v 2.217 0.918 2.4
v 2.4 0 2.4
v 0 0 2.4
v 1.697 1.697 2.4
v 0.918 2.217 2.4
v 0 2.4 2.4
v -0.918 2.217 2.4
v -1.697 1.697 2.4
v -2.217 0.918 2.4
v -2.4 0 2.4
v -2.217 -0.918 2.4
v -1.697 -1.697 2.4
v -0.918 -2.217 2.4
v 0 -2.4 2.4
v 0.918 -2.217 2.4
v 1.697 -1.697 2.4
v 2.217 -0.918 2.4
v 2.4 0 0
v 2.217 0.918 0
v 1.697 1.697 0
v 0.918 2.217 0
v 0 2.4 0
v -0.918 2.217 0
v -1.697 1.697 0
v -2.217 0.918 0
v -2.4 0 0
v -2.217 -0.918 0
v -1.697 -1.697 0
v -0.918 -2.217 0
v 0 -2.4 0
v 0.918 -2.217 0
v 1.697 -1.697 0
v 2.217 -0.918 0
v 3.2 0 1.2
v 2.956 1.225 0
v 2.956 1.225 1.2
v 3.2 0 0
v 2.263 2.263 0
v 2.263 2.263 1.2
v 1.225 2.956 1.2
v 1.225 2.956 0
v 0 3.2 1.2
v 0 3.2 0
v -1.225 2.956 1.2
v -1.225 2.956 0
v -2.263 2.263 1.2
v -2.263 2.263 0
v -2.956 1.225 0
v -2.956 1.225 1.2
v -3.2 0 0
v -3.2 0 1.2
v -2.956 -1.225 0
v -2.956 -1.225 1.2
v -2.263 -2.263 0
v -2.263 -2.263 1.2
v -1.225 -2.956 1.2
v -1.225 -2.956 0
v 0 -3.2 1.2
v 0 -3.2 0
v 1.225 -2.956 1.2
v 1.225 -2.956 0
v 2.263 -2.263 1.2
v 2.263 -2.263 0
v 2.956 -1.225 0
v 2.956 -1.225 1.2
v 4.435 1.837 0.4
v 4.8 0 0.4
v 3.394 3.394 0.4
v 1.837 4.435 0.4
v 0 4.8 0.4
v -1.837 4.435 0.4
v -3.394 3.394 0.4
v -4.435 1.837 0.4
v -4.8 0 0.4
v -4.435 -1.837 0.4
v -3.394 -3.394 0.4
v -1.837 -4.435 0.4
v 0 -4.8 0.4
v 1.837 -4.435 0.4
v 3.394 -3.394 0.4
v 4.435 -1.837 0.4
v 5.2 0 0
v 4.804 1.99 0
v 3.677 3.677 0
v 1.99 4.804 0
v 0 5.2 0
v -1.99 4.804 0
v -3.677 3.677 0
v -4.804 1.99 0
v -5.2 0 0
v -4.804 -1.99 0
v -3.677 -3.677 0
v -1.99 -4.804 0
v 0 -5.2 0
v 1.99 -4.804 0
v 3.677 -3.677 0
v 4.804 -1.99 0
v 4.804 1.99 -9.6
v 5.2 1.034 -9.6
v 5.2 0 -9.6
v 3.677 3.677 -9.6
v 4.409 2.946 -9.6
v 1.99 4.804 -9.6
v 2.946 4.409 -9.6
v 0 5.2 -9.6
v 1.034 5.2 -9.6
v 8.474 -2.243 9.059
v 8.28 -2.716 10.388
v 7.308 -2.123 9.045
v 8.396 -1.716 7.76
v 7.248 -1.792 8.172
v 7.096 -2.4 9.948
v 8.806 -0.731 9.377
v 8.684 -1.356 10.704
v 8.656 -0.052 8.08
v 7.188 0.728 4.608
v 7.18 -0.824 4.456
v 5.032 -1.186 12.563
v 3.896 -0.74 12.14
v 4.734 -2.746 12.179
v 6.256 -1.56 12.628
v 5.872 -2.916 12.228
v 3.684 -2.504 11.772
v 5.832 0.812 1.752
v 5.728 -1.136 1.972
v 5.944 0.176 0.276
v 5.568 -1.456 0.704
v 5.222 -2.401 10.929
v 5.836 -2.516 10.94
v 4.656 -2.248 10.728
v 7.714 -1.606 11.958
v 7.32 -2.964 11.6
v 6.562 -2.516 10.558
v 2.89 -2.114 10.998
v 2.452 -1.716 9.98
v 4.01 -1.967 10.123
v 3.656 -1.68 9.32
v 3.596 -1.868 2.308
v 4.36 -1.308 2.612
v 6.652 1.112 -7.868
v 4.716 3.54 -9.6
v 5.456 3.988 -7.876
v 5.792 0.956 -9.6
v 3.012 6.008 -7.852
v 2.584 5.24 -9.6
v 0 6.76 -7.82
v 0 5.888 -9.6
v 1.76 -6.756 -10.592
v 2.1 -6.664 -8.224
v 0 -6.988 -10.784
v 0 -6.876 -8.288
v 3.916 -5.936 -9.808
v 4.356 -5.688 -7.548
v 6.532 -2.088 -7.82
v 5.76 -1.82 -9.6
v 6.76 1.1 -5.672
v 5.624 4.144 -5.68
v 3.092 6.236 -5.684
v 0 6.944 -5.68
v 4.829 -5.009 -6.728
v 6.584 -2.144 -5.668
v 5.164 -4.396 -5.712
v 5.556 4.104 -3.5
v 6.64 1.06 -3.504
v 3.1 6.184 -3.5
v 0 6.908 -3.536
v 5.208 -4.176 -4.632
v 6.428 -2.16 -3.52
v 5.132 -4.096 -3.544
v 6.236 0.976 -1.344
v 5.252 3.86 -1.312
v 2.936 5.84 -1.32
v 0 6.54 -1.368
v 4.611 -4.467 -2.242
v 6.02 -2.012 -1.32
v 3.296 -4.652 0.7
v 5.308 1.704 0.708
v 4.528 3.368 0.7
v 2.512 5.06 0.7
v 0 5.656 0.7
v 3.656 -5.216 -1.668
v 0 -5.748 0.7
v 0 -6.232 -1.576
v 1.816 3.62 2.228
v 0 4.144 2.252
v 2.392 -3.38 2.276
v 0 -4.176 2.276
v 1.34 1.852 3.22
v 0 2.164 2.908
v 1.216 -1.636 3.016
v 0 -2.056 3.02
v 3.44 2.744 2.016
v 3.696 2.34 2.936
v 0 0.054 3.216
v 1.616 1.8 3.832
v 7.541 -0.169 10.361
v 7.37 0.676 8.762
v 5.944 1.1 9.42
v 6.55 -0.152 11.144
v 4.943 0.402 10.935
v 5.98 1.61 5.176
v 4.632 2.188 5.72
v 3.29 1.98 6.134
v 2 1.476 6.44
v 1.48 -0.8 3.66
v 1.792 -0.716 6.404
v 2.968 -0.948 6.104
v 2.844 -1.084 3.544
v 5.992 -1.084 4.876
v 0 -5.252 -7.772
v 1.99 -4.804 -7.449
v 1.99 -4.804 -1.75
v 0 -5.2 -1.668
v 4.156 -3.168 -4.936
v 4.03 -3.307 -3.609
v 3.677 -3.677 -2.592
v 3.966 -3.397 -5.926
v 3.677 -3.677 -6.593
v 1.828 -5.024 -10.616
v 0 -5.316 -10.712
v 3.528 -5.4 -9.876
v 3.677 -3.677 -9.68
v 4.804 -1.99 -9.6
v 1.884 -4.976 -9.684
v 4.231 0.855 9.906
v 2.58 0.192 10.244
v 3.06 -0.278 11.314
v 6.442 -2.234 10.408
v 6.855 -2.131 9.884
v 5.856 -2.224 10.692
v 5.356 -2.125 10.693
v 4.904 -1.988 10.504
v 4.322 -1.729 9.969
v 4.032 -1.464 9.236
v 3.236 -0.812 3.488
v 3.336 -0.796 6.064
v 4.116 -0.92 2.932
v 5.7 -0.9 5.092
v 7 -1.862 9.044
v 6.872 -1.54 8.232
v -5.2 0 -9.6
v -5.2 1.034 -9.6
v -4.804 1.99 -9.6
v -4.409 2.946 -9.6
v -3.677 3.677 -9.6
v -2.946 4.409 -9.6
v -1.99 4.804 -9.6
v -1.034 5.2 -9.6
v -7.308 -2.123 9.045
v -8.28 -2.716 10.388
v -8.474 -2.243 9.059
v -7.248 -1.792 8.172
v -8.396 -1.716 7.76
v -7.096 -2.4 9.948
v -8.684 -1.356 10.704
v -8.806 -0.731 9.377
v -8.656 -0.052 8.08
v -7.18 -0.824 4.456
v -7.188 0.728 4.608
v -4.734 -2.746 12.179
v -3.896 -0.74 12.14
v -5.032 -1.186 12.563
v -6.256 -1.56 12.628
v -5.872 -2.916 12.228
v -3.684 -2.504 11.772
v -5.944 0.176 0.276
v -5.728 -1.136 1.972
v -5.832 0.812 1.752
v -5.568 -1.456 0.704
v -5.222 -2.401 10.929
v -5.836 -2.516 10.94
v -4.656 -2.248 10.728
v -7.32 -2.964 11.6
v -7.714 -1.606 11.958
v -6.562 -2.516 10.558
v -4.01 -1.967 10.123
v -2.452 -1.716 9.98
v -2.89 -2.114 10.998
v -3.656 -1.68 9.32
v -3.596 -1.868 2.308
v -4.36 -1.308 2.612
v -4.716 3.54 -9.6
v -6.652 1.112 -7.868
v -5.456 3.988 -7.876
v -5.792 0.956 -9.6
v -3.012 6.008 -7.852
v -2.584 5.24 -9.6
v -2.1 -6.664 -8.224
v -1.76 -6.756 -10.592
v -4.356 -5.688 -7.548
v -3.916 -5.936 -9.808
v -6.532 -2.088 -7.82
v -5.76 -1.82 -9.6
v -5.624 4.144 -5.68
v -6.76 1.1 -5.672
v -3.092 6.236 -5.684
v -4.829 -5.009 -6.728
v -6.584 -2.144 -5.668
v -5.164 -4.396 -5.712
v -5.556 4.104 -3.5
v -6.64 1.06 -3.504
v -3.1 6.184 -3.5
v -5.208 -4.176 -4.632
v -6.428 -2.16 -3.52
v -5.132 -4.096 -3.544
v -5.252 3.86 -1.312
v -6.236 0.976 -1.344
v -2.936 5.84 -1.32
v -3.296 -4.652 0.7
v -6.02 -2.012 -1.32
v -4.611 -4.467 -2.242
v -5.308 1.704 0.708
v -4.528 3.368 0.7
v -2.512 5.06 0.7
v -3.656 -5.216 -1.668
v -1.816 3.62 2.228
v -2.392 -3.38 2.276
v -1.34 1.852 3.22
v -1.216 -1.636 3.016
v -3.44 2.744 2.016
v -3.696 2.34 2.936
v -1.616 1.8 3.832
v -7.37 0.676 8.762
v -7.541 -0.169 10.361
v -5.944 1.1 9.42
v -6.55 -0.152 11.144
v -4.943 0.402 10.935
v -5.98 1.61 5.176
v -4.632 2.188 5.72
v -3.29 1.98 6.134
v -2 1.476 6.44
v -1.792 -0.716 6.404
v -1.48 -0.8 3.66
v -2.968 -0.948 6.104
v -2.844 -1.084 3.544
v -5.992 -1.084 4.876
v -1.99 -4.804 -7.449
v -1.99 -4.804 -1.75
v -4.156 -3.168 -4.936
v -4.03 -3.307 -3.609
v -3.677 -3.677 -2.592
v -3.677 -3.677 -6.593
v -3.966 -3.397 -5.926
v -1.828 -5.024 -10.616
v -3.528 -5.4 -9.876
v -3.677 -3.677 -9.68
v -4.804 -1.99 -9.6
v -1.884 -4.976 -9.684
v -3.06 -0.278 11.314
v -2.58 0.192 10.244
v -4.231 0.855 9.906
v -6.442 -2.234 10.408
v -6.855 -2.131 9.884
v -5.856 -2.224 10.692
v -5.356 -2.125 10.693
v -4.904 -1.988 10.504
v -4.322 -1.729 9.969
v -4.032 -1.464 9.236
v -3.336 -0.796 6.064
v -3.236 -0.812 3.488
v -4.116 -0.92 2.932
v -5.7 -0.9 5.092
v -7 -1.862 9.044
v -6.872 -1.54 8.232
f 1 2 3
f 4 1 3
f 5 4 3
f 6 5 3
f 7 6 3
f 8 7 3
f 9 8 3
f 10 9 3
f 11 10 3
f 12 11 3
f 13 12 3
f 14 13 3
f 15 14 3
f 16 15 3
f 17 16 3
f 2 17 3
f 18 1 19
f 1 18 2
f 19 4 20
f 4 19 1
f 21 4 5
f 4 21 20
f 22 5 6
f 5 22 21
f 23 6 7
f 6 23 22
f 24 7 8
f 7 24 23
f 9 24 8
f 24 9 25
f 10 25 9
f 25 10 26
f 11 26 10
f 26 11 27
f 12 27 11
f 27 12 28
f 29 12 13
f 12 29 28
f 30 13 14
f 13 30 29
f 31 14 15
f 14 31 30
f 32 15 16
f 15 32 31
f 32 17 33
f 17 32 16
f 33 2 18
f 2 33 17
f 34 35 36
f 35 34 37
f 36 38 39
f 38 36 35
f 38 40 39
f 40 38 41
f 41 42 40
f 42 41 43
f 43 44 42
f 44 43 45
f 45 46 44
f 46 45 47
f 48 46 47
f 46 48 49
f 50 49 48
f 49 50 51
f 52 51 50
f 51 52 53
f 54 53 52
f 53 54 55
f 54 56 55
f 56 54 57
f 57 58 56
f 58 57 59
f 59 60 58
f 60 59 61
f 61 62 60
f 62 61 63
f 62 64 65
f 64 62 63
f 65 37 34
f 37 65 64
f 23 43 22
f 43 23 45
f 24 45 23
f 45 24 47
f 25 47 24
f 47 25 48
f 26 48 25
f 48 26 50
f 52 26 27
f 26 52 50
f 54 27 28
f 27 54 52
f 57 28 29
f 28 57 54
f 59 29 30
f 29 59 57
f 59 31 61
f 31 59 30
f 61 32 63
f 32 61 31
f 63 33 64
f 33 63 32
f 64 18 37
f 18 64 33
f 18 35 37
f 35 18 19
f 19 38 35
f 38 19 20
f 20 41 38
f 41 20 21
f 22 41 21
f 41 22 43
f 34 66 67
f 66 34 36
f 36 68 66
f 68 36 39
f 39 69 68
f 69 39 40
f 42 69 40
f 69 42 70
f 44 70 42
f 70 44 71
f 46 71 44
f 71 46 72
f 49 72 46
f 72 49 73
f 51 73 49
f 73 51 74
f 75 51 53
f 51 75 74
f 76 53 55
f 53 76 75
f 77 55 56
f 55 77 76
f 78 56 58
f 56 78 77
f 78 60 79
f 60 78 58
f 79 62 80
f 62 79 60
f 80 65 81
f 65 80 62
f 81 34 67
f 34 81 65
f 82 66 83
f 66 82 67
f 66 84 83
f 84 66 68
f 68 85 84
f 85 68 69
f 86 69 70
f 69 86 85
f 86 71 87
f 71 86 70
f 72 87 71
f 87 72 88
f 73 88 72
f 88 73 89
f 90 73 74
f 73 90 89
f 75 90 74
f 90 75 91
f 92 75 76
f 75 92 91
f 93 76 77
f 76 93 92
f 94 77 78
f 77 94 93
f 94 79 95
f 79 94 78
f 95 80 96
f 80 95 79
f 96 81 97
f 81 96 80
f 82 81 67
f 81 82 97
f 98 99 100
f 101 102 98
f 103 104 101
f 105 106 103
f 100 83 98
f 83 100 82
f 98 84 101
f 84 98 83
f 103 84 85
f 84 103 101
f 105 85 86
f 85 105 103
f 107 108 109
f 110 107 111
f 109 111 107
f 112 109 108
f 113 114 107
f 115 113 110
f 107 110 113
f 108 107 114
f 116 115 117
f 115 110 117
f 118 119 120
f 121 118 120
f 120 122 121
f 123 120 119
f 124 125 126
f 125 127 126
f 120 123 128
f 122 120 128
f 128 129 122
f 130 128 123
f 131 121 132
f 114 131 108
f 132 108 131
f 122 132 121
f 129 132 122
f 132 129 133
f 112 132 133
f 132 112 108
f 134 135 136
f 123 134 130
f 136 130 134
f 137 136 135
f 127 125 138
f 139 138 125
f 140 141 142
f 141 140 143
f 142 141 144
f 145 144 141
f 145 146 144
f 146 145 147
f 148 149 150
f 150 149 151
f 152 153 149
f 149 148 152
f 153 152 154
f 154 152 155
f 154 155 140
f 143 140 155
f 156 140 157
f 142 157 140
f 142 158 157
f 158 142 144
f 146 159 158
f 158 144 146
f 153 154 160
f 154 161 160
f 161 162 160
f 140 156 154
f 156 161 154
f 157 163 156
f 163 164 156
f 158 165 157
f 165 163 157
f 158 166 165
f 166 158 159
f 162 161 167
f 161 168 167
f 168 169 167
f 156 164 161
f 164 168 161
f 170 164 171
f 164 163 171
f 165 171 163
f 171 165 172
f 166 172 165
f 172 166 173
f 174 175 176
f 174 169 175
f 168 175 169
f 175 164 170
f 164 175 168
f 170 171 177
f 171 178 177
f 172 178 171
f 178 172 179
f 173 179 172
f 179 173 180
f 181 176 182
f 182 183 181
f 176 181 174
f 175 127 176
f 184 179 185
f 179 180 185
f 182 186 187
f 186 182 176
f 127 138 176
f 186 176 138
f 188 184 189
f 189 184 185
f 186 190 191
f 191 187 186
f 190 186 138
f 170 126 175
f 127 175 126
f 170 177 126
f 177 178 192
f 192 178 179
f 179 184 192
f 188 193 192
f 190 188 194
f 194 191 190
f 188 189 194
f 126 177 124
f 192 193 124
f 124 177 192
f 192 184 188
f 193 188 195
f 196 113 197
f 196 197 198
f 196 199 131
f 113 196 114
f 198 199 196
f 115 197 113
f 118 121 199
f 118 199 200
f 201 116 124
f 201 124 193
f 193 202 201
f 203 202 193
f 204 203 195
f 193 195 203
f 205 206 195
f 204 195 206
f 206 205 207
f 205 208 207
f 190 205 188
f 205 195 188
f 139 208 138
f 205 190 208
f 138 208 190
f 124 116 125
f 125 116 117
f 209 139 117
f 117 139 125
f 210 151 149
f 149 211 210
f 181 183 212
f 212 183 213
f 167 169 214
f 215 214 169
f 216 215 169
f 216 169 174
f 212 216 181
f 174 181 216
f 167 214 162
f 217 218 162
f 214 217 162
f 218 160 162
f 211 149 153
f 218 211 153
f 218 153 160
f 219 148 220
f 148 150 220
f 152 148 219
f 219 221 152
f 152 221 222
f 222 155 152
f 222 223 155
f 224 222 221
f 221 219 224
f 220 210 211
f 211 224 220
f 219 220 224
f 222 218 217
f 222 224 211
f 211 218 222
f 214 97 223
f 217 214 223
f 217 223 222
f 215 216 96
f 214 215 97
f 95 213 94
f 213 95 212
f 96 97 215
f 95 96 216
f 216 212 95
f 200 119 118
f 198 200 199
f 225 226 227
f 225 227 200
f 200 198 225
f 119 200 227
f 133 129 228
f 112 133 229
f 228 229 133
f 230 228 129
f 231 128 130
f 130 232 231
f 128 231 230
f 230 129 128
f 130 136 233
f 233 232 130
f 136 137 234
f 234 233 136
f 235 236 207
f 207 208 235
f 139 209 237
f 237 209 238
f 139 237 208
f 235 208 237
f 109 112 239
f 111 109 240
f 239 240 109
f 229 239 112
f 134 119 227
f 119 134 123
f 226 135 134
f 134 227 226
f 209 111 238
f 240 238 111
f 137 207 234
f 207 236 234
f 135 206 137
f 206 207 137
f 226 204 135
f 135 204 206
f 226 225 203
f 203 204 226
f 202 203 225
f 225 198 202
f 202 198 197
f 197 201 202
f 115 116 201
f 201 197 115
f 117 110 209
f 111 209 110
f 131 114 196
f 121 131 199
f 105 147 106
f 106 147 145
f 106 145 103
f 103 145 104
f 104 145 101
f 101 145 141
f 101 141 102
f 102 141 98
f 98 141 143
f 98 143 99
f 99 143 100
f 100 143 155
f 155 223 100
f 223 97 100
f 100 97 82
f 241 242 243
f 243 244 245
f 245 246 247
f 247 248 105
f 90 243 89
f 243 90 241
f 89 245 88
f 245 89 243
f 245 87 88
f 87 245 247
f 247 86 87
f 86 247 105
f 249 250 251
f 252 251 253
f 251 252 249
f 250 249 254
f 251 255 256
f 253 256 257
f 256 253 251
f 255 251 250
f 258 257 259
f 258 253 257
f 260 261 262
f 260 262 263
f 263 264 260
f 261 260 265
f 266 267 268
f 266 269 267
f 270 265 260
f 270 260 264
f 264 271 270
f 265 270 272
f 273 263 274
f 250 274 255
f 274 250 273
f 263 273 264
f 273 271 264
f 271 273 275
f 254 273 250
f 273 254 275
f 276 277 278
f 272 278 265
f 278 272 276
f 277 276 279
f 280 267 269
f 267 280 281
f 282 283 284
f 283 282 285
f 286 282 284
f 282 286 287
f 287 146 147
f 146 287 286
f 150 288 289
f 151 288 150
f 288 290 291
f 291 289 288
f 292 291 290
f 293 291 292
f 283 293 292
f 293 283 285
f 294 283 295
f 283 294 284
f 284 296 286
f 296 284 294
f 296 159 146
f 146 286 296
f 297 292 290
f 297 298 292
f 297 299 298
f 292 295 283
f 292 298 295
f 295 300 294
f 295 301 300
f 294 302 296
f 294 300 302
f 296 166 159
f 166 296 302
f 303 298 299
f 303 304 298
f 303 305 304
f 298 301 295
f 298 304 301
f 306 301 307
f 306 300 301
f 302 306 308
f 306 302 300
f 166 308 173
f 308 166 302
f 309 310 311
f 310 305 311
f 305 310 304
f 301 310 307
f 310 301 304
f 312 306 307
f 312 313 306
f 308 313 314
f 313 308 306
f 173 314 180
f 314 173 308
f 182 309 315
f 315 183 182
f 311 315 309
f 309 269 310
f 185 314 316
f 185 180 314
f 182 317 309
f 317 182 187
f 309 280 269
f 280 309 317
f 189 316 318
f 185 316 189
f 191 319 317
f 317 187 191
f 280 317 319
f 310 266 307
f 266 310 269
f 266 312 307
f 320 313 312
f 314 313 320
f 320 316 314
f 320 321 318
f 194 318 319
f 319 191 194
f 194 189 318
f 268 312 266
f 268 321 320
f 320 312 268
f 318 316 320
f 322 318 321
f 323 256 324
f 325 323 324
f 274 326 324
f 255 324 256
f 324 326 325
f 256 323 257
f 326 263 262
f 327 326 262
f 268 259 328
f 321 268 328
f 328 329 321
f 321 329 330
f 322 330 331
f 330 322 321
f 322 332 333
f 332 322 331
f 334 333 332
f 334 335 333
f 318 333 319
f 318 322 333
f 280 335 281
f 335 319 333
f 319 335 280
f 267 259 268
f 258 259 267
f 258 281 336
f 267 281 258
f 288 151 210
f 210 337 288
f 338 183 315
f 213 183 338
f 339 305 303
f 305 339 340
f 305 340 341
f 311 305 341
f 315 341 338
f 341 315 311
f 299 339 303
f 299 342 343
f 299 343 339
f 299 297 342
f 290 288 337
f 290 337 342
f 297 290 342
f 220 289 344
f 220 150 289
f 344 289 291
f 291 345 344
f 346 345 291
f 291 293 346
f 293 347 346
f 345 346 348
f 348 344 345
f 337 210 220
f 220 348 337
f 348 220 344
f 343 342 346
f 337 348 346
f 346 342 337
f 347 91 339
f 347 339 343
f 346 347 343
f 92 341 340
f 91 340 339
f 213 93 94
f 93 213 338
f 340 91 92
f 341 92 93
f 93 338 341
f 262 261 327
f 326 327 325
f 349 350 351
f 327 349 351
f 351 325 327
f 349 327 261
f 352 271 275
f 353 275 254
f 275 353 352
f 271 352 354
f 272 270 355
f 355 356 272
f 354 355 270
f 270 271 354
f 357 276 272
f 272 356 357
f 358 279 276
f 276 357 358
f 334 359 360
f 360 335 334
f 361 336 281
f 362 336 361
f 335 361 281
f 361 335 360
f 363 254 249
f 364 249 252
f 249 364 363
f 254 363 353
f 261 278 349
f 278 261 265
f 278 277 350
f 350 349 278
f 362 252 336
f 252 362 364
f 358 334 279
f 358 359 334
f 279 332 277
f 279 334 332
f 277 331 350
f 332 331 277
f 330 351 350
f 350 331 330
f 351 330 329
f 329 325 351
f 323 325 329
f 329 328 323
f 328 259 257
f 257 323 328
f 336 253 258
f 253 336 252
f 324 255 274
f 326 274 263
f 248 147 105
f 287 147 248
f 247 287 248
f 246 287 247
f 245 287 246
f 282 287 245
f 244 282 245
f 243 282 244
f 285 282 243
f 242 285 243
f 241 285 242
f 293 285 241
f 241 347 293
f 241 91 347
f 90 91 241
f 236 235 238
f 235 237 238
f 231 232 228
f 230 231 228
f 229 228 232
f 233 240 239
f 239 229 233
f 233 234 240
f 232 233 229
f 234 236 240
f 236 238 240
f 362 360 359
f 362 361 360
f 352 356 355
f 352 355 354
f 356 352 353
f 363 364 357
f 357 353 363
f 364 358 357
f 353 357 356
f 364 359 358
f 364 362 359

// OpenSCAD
use <../lib.scad>
use <../p/4-4con12.scad>
use <../p/4-4con2.scad>
use <../p/4-4disc.scad>
use <s/99244s01.scad>
use <s/99244s02.scad>
use <../p/stud4h.scad>
function ldraw_lib__99244() = [
// 0 Minifig Headdress Rabbit
// 0 Name: 99244.dat
// 0 Author: Gerald Lasser [GeraldLasser]
// 0 !LDRAW_ORG Part UPDATE 2023-04
// 0 !LICENSE Licensed under CC BY 4.0 : see CAreadme.txt
// 
// 0 BFC CERTIFY CCW
  [0,"BFC","CERTIFY"],
  [0,"BFC","CCW"],
// 
// 0 !CATEGORY Minifig Headwear
// 0 !KEYWORDS Bunny, Costume, Ears, mask
// 
// 0 !HISTORY 2023-08-25 [OrionP] Official Update 2023-04
// 
// 
// 1 16 0 -6 0 6 0 0 0 -1 0 0 0 6 4-4disc.dat
  [1,16,0,-6,0,6,0,0,0,-1,0,0,0,6, ldraw_lib__4_4disc()],
// 1 16 0 -3 0 1 0 0 0 -.75 0 0 0 1 stud4h.dat
  [1,16,0,-3,0,1,0,0,0,-.75,0,0,0,1, ldraw_lib__stud4h()],
// 0 BFC INVERTNEXT
  [0,"BFC","INVERTNEXT"],
// 1 16 0 -1 0 4 0 0 0 -2 0 0 0 4 4-4con2.dat
  [1,16,0,-1,0,4,0,0,0,-2,0,0,0,4, ldraw_lib__4_4con2()],
// 0 BFC INVERTNEXT
  [0,"BFC","INVERTNEXT"],
// 1 16 0 0 0 1 0 0 0 -1 0 0 0 1 4-4con12.dat
  [1,16,0,0,0,1,0,0,0,-1,0,0,0,1, ldraw_lib__4_4con12()],
// 
// 1 16 0 0 0 1 0 0 0 1 0 0 0 1 s\99244s01.dat
  [1,16,0,0,0,1,0,0,0,1,0,0,0,1, ldraw_lib__s__99244s01()],
// 1 16 0 0 0 -1 0 0 0 1 0 0 0 1 s\99244s01.dat
  [1,16,0,0,0,-1,0,0,0,1,0,0,0,1, ldraw_lib__s__99244s01()],
// 
// 1 16 0 0 0 1 0 0 0 1 0 0 0 1 s\99244s02.dat
  [1,16,0,0,0,1,0,0,0,1,0,0,0,1, ldraw_lib__s__99244s02()],
// 1 16 0 0 0 -1 0 0 0 1 0 0 0 1 s\99244s02.dat
  [1,16,0,0,0,-1,0,0,0,1,0,0,0,1, ldraw_lib__s__99244s02()],
// 
// 5 24 0 8.84 17.27 0 3.42 16.35 -7.34 3.3 14.6 7.34 3.3 14.6
  [5,24,0,8.84,17.27,0,3.42,16.35,-7.34,3.3,14.6,7.34,3.3,14.6],
// 5 24 0 3.94 -15.58 0 4.17 -13 4.9751 4.3745 -12.0107 -4.9751 4.3745 -12.0107
  [5,24,0,3.94,-15.58,0,4.17,-13,4.9751,4.3745,-12.0107,-4.9751,4.3745,-12.0107],
// 5 24 0 19.43 -13.13 0 20.72 -17.19 5.25 20.56 -16.66 -5.25 20.56 -16.66
  [5,24,0,19.43,-13.13,0,20.72,-17.19,5.25,20.56,-16.66,-5.25,20.56,-16.66],
// 5 24 0 -7.55 -5.14 0 -5.69 -10.44 5.98 -5.69 -8.45 -5.98 -5.69 -8.45
  [5,24,0,-7.55,-5.14,0,-5.69,-10.44,5.98,-5.69,-8.45,-5.98,-5.69,-8.45],
// 5 24 0 24 14.72 0 19.55 16.9 -7.53 19.63 15.02 7.53 19.63 15.02
  [5,24,0,24,14.72,0,19.55,16.9,-7.53,19.63,15.02,7.53,19.63,15.02],
// 5 24 0 -7.27 5.41 0 -8.04 .135 3.35 -8.05 4.63 -3.35 -8.05 4.63
  [5,24,0,-7.27,5.41,0,-8.04,.135,3.35,-8.05,4.63,-3.35,-8.05,4.63],
// 5 24 0 -5.63 10.36 0 -7.27 5.41 4.54 -5.57 9.05 -4.54 -5.57 9.05
  [5,24,0,-5.63,10.36,0,-7.27,5.41,4.54,-5.57,9.05,-4.54,-5.57,9.05],
// 5 24 0 20.72 -17.19 0 26.96 -17.47 -5.25 20.56 -16.66 5.25 20.56 -16.66
  [5,24,0,20.72,-17.19,0,26.96,-17.47,-5.25,20.56,-16.66,5.25,20.56,-16.66],
// 5 24 0 19.55 16.9 0 14.2 17.36 -7.53 19.63 15.02 7.53 19.63 15.02
  [5,24,0,19.55,16.9,0,14.2,17.36,-7.53,19.63,15.02,7.53,19.63,15.02],
// 5 24 0 -8.04 .135 0 -7.55 -5.14 3.04 -7.54 -4.09 -3.04 -7.54 -4.09
  [5,24,0,-8.04,.135,0,-7.55,-5.14,3.04,-7.54,-4.09,-3.04,-7.54,-4.09],
// 5 24 0 4.17 -13 0 0 -13 -4.9751 0 -12.0107 4.9751 0 -12.0107
  [5,24,0,4.17,-13,0,0,-13,-4.9751,0,-12.0107,4.9751,0,-12.0107],
// 5 24 0 3.42 16.35 0 -1.75 14.14 -6.28 -1.75 12.65 6.28 -1.75 12.65
  [5,24,0,3.42,16.35,0,-1.75,14.14,-6.28,-1.75,12.65,6.28,-1.75,12.65],
// 5 24 0 -1.75 14.14 0 -5.63 10.36 -6.28 -1.75 12.65 6.28 -1.75 12.65
  [5,24,0,-1.75,14.14,0,-5.63,10.36,-6.28,-1.75,12.65,6.28,-1.75,12.65],
// 5 24 0 26.78 -13.29 0 19.43 -13.13 4.9751 18.623 -12.0107 -4.9751 18.623 -12.0107
  [5,24,0,26.78,-13.29,0,19.43,-13.13,4.9751,18.623,-12.0107,-4.9751,18.623,-12.0107],
// 5 24 0 -5.69 -10.44 0 -1.75 -14.37 -8.24 -1.75 -11.63 8.24 -1.75 -11.63
  [5,24,0,-5.69,-10.44,0,-1.75,-14.37,-8.24,-1.75,-11.63,8.24,-1.75,-11.63],
// 5 24 0 -1.75 -14.37 0 3.94 -15.58 -9.14 4.17 -13.04 9.14 4.17 -13.04
  [5,24,0,-1.75,-14.37,0,3.94,-15.58,-9.14,4.17,-13.04,9.14,4.17,-13.04],
// 5 24 0 14.2 17.36 0 8.84 17.27 7.75 8.75 15.46 -7.75 8.75 15.46
  [5,24,0,14.2,17.36,0,8.84,17.27,7.75,8.75,15.46,-7.75,8.75,15.46],
// 5 24 0 26.96 -17.47 0 26.78 -13.29 4.4 26.48 -16.89 -4.4 26.48 -16.89
  [5,24,0,26.96,-17.47,0,26.78,-13.29,4.4,26.48,-16.89,-4.4,26.48,-16.89],
];
module ldraw_lib__99244(step=0, col=false, unit=2/5, alt=false, line=0.2, solid=!$preview)
    makepoly(ldraw_lib__99244(), step=step, col=col, unit=unit, alt=alt, line=line, solid=solid);
ldraw_lib__99244(line=0.2);
